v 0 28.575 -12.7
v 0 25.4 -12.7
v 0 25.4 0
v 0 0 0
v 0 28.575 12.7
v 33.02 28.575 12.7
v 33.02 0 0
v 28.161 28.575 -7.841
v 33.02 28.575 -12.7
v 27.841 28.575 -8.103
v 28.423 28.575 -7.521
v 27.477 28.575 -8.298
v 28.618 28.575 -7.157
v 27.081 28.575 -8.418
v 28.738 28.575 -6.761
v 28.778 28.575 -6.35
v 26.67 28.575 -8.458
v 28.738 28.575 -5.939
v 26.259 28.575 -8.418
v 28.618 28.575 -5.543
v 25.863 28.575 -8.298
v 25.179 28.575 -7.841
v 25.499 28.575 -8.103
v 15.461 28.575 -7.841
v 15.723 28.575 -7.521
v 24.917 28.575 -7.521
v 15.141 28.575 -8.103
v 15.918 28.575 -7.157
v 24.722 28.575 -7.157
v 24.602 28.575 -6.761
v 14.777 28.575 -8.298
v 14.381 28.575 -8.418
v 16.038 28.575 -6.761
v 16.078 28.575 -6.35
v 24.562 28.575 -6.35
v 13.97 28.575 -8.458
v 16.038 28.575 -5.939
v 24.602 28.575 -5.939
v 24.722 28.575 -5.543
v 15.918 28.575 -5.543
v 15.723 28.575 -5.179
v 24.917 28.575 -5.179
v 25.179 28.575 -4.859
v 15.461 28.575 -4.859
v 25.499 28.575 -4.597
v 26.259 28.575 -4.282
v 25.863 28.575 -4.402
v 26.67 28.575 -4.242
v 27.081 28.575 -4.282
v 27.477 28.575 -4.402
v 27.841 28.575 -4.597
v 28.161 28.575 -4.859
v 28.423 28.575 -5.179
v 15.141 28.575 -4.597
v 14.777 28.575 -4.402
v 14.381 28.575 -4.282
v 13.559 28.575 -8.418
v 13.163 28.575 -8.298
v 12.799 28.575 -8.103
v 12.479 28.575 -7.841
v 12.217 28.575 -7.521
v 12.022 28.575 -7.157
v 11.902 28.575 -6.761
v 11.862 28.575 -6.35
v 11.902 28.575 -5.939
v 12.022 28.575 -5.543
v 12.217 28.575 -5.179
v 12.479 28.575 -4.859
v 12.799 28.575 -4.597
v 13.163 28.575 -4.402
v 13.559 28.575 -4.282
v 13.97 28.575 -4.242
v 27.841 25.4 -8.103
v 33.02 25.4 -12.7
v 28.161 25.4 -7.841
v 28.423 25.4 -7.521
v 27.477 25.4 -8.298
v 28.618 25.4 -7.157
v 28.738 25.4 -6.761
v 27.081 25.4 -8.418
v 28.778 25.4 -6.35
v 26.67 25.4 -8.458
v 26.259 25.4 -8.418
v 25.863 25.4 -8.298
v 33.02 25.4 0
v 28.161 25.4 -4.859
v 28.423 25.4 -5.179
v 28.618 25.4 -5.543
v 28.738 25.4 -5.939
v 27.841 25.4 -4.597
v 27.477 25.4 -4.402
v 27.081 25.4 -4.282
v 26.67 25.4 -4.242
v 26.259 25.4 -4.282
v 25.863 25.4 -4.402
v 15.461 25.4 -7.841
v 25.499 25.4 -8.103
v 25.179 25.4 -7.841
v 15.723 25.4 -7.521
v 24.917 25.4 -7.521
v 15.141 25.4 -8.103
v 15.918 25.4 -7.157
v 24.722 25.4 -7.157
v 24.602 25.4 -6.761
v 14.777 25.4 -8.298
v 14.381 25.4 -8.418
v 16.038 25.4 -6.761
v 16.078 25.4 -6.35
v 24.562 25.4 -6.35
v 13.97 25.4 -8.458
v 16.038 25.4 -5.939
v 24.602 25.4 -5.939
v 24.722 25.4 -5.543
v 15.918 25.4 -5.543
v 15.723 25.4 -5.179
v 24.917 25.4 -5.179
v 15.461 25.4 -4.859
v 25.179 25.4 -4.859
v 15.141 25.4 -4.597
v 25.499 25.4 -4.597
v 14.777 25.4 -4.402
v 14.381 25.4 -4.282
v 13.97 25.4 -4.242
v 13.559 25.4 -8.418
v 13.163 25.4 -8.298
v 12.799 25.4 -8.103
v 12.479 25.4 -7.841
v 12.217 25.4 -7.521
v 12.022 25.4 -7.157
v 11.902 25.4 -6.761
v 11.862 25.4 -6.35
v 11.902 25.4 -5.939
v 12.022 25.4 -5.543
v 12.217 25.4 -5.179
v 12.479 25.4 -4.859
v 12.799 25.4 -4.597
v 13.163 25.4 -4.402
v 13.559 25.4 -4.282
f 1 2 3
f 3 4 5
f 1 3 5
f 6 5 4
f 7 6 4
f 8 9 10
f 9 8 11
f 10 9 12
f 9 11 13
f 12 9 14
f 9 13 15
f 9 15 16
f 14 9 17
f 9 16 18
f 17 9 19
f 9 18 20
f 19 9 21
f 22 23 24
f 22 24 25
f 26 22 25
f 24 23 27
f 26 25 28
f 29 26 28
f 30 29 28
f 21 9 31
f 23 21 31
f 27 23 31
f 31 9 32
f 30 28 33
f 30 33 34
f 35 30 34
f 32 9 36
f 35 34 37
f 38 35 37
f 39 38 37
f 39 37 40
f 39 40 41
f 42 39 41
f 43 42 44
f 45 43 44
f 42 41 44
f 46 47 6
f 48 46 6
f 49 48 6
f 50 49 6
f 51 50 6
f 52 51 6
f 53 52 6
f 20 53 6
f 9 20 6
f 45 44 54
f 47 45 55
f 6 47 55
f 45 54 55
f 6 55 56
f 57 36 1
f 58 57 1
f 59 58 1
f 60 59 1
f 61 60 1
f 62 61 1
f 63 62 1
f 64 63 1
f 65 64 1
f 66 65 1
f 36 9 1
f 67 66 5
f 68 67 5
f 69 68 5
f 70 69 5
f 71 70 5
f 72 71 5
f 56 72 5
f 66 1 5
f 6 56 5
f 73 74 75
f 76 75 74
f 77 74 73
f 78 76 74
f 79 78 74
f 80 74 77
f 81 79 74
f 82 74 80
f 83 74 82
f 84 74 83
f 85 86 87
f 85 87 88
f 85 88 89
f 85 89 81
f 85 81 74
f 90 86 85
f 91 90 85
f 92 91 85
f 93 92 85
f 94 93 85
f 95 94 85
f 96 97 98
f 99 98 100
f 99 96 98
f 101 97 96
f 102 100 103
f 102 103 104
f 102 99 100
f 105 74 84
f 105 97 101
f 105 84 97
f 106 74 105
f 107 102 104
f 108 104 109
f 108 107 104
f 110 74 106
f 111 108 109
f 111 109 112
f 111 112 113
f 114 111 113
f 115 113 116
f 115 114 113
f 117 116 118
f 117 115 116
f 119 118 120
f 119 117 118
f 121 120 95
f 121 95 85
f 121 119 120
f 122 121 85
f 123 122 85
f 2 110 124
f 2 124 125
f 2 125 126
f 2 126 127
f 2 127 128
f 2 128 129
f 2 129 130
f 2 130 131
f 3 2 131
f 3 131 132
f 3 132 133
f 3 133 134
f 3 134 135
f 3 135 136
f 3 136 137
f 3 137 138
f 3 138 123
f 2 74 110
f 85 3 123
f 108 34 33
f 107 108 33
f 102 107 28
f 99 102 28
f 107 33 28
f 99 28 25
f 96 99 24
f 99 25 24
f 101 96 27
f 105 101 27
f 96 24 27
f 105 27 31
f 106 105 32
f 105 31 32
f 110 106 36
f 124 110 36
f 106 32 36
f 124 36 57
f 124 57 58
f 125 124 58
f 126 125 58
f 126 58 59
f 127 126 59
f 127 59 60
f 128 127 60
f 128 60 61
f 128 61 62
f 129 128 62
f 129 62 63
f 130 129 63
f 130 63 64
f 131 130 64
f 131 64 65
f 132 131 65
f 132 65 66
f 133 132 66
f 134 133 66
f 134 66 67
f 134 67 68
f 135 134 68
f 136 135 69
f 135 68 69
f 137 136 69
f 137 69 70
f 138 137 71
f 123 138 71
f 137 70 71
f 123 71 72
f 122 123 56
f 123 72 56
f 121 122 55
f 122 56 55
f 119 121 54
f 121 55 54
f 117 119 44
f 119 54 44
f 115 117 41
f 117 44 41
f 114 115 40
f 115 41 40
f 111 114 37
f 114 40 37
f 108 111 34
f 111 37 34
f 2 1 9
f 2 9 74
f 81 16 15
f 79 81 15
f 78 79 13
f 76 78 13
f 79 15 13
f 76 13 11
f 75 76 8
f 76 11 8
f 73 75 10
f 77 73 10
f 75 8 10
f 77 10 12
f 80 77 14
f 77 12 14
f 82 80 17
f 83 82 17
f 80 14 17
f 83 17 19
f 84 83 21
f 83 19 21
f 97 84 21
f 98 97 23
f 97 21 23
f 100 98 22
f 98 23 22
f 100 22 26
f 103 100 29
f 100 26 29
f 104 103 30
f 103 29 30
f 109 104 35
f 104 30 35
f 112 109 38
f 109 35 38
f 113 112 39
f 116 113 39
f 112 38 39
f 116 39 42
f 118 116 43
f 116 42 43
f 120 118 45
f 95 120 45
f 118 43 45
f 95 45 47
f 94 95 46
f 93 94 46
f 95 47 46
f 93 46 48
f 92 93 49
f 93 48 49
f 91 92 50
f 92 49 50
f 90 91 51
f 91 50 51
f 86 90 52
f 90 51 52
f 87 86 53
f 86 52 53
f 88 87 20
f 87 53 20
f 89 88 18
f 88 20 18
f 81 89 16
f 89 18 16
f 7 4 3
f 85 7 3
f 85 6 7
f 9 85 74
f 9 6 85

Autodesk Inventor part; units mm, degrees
ref_plane "YZ Plane" through (0, 0, 0) normal (1, 0, 0) x (0, 1, 0)
ref_plane "XZ Plane" through (0, 0, 0) normal (0, 1, 0) x (-1, 0, 0)
ref_plane "XY Plane" through (0, 0, 0) normal (0, 0, 1) x (1, 0, 0)
sketch "Sketch1" plane through (0, 0, 0) normal (1, 0, 0) x (0, 1, 0)
  line L0 (0, 0) -> (25.4, 0)
  line L1 (25.4, 0) -> (28.575, 0)
  line L2 (28.575, 0) -> (28.575, -12.7)
  line L3 (28.575, -12.7) -> (25.4, -12.7)
  line L4 (25.4, -12.7) -> (25.4, 0)
  line L5 (28.575, 0) -> (28.575, 12.7)
  line L6 (28.575, 12.7) -> (0, 0)
  dimension "d0" = 25.4
  dimension "d1" = 3.175
  dimension "d2" = 12.7
  dimension "d3" = 12.7
extrude "Extrusion1" add sketch "Sketch1" along normal blind 53.34
sketch "Sketch2" plane through (0, 28.575, 12.7) normal (0, 1, 0) x (1, 0, 0)
  line L0 (53.34, 25.4) -> (53.34, 19.05)
  line L1 (53.34, 25.4) -> (53.34, 0) projected
  line L2 (53.34, 19.05) -> (26.67, 19.05)
  circle A0 centre (26.67, 19.05) radius 2.1082
  point P0 (0, 12.7)
  dimension "d6" = 6.35
  dimension "d7" = 26.67
  dimension "d8" = 4.2164
extrude "Extrusion2" cut sketch "Sketch2" against normal blind 43.815
sketch "Sketch3" plane through (53.34, 0, 0) normal (1, 0, 0) x (0, 0, -1)
  line L0 (12.7, 25.4) -> (12.7, 28.575) projected
  line L1 (12.7, 28.575) -> (-16.4619, 28.575)
  line L2 (-16.4619, 28.575) -> (-16.4619, 0)
  line L3 (-16.4619, 0) -> (12.7, 0)
  line L4 (12.7, 0) -> (12.7, 28.575)
  point P0 (0, 0)
extrude "Extrusion3" cut sketch "Sketch3" against normal blind 20.32
sketch "Sketch4" plane through (0, 28.575, 12.7) normal (0, 1, 0) x (1, 0, 0)
  circle A0 centre (26.67, 19.05) radius 2.1082 projected
  line L0 (26.67, 19.05) -> (13.97, 19.05)
  circle A1 centre (13.97, 19.05) radius 2.1082
  point P0 (0, 12.7)
  dimension "d13" = 12.7
extrude "Extrusion4" cut sketch "Sketch4" against normal blind 20.32 contours A1
properties part number "sleds v2"
